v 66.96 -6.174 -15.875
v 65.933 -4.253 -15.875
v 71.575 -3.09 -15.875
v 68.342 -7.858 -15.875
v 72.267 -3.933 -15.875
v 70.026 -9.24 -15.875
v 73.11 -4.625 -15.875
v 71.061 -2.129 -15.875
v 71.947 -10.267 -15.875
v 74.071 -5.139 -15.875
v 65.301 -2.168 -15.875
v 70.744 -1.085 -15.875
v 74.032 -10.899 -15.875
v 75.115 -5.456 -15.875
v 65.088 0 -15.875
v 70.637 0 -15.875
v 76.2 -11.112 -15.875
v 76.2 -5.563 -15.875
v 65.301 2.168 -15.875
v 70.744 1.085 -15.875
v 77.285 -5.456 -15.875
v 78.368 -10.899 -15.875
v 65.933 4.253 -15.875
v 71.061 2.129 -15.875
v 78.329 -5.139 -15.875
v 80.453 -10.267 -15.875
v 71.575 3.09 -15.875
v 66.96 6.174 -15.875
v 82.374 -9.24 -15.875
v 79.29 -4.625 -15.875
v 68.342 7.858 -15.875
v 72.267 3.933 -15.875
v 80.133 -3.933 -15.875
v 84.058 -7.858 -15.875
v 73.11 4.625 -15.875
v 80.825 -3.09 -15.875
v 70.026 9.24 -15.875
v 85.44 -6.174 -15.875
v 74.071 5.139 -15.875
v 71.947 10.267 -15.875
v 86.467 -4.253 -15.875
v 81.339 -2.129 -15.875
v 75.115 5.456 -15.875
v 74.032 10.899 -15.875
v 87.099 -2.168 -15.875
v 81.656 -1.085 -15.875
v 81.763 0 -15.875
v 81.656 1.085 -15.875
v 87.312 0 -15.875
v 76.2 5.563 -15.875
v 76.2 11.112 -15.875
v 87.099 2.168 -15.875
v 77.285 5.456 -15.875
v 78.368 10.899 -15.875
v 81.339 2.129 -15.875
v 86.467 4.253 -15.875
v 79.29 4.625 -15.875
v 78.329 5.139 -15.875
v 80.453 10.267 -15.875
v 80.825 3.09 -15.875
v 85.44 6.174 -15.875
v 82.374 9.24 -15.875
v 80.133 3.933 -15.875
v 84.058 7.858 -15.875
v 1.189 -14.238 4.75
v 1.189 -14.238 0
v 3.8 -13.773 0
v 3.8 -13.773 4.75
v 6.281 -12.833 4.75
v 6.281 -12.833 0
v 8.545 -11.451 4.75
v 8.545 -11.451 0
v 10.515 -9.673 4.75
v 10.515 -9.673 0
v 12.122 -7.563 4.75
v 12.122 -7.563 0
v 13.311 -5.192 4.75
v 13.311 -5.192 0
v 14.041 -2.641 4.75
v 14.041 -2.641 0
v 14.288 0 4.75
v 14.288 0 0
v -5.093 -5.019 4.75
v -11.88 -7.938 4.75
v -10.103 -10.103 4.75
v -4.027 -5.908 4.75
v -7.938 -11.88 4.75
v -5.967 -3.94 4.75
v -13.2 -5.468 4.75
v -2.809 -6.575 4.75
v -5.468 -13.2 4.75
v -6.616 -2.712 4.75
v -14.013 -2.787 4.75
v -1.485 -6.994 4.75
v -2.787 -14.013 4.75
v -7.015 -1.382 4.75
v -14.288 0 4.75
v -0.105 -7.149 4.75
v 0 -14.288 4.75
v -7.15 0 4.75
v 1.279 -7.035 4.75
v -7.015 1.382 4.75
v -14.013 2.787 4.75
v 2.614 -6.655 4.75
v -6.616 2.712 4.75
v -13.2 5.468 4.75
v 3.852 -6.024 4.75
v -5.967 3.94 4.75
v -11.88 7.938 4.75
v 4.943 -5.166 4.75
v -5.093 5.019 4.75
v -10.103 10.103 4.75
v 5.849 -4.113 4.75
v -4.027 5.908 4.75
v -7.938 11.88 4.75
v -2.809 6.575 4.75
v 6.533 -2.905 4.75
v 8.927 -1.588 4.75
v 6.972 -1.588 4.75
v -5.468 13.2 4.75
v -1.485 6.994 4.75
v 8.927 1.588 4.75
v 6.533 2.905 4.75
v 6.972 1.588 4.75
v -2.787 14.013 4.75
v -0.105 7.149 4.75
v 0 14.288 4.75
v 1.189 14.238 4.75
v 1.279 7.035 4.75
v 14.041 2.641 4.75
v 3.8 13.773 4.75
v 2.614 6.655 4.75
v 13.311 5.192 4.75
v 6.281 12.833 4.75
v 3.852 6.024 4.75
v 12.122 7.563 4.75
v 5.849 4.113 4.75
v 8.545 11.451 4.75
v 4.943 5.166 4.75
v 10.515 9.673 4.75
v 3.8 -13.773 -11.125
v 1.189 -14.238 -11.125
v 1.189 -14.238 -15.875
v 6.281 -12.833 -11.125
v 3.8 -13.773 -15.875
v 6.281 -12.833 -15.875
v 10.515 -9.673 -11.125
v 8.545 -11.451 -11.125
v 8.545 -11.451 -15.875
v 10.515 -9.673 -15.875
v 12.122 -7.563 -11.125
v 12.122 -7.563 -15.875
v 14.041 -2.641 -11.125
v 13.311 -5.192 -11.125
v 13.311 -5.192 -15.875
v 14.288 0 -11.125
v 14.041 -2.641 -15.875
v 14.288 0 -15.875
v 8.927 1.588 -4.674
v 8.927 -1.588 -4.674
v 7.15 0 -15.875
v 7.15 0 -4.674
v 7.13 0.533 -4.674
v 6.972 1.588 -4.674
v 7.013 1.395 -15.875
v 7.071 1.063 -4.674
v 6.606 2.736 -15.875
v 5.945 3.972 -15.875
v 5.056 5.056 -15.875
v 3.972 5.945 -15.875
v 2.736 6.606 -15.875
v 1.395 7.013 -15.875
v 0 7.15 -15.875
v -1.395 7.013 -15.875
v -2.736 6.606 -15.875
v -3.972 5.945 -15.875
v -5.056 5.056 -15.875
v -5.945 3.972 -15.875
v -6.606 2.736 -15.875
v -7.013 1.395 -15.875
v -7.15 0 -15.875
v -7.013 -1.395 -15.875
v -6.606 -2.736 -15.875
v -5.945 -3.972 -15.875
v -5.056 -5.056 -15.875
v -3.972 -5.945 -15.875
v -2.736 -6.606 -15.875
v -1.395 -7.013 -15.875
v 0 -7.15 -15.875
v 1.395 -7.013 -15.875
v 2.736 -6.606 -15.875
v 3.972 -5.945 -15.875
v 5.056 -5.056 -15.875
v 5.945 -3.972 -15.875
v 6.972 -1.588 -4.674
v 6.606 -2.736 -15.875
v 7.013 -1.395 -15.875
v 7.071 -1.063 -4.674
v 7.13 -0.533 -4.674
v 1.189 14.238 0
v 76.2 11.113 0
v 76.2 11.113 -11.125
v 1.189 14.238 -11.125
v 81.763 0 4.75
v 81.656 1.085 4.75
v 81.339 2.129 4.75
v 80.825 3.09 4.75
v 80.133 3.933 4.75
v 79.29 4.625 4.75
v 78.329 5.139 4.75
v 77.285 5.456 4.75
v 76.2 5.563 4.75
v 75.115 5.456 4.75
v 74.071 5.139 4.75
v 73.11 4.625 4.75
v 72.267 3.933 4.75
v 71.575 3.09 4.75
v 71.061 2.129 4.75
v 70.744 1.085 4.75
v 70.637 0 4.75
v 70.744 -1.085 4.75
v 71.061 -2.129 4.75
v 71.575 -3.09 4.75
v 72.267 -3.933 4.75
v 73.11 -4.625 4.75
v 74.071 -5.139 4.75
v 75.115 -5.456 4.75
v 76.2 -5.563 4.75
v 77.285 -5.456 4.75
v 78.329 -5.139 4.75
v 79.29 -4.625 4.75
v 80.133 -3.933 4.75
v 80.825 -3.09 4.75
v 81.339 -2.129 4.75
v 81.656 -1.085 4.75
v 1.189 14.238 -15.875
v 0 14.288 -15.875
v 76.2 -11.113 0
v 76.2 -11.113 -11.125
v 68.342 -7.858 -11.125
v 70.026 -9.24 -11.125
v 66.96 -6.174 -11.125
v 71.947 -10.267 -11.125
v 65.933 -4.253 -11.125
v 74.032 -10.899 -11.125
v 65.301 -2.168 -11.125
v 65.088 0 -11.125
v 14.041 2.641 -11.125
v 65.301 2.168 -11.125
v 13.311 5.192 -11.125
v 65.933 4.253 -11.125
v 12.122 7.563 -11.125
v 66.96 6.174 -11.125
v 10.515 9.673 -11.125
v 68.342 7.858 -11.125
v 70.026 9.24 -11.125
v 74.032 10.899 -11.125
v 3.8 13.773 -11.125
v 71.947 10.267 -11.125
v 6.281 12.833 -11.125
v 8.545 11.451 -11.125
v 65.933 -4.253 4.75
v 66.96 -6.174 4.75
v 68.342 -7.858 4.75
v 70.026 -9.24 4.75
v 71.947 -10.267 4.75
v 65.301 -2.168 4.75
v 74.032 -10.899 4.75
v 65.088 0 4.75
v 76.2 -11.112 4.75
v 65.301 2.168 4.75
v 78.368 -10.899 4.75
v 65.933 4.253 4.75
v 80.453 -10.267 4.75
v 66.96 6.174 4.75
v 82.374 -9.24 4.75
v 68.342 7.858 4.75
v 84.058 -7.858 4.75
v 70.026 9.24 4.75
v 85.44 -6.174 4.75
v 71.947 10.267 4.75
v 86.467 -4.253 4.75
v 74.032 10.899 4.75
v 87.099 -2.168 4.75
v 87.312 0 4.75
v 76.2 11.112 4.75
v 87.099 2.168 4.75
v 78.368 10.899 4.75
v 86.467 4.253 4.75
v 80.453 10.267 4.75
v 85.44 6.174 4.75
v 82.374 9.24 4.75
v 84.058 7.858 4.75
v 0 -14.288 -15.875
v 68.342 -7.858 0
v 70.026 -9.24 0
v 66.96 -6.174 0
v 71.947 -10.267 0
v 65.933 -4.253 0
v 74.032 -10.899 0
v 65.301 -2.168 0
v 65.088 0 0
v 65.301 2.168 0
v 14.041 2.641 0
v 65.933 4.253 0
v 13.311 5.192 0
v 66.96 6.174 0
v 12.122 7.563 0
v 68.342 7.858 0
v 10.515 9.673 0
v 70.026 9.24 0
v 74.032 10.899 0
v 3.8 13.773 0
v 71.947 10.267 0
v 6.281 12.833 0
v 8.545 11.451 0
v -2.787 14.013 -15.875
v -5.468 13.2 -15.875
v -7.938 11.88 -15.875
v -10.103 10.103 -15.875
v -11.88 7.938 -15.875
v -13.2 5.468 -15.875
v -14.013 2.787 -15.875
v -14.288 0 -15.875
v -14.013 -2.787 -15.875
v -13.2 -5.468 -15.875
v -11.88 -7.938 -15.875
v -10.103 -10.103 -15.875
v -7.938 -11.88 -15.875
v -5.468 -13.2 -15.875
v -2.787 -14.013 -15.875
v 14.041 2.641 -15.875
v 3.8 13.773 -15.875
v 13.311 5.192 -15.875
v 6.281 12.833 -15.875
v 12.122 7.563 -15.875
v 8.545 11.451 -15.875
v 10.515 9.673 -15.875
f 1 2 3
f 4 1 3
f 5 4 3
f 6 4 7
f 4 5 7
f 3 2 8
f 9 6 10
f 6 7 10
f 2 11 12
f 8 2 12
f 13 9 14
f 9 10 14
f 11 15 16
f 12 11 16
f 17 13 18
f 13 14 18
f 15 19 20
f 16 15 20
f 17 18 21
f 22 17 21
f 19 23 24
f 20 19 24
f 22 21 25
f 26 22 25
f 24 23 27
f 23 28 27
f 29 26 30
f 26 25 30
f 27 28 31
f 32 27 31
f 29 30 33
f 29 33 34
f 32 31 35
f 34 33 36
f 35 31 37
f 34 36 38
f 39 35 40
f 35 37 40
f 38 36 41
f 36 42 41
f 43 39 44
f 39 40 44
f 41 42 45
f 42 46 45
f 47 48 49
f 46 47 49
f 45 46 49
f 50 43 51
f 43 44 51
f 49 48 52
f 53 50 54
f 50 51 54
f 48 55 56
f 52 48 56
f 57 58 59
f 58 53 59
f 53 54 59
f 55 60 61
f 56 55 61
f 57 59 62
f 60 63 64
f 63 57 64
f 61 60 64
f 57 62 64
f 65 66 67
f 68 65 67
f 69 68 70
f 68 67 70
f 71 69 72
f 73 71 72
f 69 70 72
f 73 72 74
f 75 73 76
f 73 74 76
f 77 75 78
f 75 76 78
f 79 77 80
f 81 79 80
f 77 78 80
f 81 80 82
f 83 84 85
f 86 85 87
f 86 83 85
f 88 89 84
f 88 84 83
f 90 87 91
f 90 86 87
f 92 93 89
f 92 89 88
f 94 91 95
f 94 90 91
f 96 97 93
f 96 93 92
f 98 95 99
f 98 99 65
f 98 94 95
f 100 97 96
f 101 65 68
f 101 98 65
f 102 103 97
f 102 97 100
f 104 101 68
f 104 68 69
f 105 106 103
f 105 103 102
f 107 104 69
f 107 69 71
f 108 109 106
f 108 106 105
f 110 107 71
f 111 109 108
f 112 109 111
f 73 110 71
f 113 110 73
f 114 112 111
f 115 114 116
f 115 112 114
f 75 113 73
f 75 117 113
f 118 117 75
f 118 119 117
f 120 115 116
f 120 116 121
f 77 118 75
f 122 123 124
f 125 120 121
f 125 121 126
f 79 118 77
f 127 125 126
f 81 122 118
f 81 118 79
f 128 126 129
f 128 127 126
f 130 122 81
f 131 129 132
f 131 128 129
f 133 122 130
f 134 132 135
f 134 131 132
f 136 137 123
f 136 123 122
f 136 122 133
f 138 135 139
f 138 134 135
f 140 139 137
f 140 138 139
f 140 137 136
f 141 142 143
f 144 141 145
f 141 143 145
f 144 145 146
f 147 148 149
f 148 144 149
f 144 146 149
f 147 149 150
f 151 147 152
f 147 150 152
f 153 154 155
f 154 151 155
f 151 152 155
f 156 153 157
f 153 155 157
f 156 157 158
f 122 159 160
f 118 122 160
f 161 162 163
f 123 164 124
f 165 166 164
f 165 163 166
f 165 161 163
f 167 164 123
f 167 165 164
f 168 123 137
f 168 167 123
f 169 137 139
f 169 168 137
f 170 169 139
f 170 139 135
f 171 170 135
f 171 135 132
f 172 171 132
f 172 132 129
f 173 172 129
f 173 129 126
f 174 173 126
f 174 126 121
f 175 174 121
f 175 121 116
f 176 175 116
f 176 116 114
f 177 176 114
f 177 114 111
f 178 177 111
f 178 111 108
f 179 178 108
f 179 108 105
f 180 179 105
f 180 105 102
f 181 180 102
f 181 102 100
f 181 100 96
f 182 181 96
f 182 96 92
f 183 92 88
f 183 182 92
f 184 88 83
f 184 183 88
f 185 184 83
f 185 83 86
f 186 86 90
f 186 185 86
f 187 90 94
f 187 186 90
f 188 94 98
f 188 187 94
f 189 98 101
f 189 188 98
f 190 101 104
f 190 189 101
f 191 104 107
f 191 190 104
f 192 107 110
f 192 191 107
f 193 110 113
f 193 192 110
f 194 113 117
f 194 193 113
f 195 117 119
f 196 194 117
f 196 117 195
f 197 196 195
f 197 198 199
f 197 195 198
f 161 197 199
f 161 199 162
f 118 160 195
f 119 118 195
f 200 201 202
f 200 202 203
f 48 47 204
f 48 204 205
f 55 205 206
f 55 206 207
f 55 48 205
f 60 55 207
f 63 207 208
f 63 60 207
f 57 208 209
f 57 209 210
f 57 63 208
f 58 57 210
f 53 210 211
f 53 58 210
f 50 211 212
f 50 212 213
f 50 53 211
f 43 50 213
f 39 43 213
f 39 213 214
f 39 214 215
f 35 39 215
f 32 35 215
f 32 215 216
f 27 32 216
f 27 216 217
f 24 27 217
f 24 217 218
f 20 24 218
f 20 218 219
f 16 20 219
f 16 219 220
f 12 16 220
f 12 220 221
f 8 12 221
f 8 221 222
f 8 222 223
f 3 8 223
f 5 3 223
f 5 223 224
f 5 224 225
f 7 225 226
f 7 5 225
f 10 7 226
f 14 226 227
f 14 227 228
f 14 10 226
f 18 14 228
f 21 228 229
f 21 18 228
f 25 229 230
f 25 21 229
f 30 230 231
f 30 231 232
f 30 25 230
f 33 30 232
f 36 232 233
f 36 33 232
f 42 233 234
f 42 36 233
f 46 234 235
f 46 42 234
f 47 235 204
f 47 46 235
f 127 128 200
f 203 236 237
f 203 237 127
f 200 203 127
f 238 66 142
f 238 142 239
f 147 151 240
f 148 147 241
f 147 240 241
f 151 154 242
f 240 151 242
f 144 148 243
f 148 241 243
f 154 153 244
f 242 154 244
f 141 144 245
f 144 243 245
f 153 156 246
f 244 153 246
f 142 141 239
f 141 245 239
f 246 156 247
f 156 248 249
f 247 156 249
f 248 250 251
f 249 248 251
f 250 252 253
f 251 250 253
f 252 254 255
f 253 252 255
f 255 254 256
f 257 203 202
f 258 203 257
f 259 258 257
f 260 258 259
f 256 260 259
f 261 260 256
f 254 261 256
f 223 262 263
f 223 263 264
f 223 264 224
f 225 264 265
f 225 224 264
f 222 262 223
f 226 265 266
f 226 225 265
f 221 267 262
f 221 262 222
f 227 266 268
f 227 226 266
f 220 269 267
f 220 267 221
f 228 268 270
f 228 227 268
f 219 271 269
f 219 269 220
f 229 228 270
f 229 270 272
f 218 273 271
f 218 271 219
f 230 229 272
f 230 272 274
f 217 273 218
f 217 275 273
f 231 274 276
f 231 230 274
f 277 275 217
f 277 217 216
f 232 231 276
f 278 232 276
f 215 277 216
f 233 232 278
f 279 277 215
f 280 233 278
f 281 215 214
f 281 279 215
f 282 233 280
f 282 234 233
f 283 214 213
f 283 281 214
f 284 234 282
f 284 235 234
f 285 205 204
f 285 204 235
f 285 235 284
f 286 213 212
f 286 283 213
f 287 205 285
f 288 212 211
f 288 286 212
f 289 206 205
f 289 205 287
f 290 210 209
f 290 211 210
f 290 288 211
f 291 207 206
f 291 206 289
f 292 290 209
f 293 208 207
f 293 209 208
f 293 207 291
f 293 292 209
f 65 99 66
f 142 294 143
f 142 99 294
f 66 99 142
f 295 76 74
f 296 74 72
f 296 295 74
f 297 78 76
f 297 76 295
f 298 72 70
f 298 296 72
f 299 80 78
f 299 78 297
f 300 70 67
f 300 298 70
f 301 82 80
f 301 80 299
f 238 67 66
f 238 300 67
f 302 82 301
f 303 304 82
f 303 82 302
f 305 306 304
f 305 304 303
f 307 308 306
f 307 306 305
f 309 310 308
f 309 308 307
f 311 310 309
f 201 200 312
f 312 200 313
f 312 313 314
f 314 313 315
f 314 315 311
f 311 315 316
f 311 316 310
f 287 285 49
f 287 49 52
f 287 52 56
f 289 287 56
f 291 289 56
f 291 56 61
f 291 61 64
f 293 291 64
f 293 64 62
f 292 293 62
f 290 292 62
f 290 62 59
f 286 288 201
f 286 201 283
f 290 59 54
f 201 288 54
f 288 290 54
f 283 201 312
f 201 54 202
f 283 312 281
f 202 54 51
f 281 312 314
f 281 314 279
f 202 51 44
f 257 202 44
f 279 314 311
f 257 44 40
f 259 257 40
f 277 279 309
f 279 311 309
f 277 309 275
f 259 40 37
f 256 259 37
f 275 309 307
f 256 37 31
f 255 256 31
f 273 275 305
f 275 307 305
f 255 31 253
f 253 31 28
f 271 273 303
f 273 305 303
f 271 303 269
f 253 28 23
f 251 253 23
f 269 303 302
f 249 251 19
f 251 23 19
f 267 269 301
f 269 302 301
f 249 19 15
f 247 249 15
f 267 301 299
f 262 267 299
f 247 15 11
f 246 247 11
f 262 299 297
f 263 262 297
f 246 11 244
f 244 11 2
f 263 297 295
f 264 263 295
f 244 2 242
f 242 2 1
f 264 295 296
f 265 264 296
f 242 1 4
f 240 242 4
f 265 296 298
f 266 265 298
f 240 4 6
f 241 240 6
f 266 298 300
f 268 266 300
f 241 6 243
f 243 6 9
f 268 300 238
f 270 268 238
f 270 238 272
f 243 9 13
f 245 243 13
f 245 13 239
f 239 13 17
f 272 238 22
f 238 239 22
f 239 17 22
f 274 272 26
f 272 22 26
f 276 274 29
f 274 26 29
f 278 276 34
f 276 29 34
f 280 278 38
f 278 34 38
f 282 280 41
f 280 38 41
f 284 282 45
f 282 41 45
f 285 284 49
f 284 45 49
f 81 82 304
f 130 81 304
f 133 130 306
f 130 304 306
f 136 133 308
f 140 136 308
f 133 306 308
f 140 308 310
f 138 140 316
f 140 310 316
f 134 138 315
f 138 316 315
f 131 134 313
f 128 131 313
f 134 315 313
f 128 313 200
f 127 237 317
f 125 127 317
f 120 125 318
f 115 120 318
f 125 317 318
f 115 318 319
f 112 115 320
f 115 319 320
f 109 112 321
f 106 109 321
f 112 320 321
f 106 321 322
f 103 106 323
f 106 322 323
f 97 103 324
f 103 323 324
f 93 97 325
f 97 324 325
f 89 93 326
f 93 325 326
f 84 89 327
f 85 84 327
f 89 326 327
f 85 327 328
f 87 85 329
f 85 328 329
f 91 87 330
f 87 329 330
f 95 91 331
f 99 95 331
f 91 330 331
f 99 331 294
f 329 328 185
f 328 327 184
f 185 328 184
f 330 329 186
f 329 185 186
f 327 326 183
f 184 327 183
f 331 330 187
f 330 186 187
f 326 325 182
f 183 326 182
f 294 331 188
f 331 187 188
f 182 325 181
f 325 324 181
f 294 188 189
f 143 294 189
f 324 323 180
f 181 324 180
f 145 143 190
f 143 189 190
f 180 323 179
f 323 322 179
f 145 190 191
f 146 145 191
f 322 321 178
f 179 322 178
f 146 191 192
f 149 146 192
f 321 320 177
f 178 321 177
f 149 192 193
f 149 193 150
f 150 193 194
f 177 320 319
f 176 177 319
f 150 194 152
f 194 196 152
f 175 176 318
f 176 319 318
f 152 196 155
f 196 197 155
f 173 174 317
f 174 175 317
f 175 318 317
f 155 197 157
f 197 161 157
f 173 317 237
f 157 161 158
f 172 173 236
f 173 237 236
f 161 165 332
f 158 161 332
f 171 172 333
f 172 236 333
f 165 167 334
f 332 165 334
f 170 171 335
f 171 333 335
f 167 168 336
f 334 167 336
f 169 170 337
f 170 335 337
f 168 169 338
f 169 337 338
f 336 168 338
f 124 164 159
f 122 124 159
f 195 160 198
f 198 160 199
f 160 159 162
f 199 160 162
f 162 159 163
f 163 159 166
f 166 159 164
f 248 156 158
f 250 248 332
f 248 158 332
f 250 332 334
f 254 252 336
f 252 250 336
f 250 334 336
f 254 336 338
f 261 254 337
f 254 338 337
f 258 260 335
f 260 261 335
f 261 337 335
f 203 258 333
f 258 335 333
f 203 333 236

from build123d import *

# Parameters (mm, degrees)
SKETCH1_R               = 7.1501
BOSS_EXTRUDE1_DEPTH     = 4.7498
SKETCH1_R_2             = 11.1125
SKETCH1_R_3             = 5.5626
BOSS_EXTRUDE1_2_DEPTH   = 4.7498
BOSS_EXTRUDE2_DEPTH     = 11.1252
BOSS_EXTRUDE3_START     = -15.875
SKETCH1_4_R             = 7.1501
SKETCH1_4_R_2           = 11.1125
SKETCH1_4_R_3           = 5.5626
BOSS_EXTRUDE3_DEPTH     = 15.875
CUT_EXTRUDE2_DEPTH      = 4.826
CUT_EXTRUDE2_DEPTH_BACK = 4.6736


with BuildPart() as part:
    # Sketch1 → Boss-Extrude1 (new body)
    with BuildSketch(Plane.XY):
        with BuildLine():
            Line((1.188561525, 14.237976603), (0, 14.2875))
            ThreePointArc((0, 14.2875), (-14.2875, 0), (0, -14.2875))
            Line((0, -14.2875), (1.188561525, -14.237976603))
            ThreePointArc((1.188561525, -14.237976603), (14.2875, 0), (1.188561525, 14.237976603))
        make_face()
        Circle(SKETCH1_R, mode=Mode.SUBTRACT)
    extrude(amount=BOSS_EXTRUDE1_DEPTH)



with BuildPart() as body_2:
    # Sketch1 → Boss-Extrude1 2 (new body)
    with BuildSketch(Plane.XY):
        with Locations((76.2, 0)):
            Circle(SKETCH1_R_2)
        with Locations((76.2, 0)):
            Circle(SKETCH1_R_3, mode=Mode.SUBTRACT)
    extrude(amount=BOSS_EXTRUDE1_2_DEPTH)


with BuildPart() as body_3:
    # Sketch1<3> → Boss-Extrude2 (new body)
    with BuildSketch(Plane.XY):
        with BuildLine():
            Line((76.2, 11.1125), (1.188561525, 14.237976603))
            ThreePointArc((1.188561525, 14.237976603), (10.514614331, 9.673445184), (14.2875, 0))
            ThreePointArc((14.2875, 0), (10.514614331, -9.673445184), (1.188561525, -14.237976603))
            Line((1.188561525, -14.237976603), (76.2, -11.1125))
            ThreePointArc((76.2, -11.1125), (65.0875, 0), (76.2, 11.1125))
        make_face()
    extrude(amount=-BOSS_EXTRUDE2_DEPTH)


with BuildPart() as part_1:
    add(part.part)

    add(body_2.part)  # Boss-Extrude3 merges body 2

    add(body_3.part)  # Boss-Extrude3 merges body 3
    # Sketch1<4> → Boss-Extrude3 (add)
    # profile 1 of 2: a face of its own
    with BuildSketch(Plane.XY.offset(BOSS_EXTRUDE3_START)):
        with BuildLine():
            Line((1.188561525, 14.237976603), (0, 14.2875))
            ThreePointArc((0, 14.2875), (-14.2875, 0), (0, -14.2875))
            Line((0, -14.2875), (1.188561525, -14.237976603))
            ThreePointArc((1.188561525, -14.237976603), (14.2875, 0), (1.188561525, 14.237976603))
        make_face()
        Circle(SKETCH1_4_R, mode=Mode.SUBTRACT)
    # profile 2 of 2: a face of its own
    with BuildSketch(Plane.XY.offset(BOSS_EXTRUDE3_START)):
        with Locations((76.2, 0)):
            Circle(SKETCH1_4_R_2)
        with Locations((76.2, 0)):
            Circle(SKETCH1_4_R_3, mode=Mode.SUBTRACT)
    extrude(amount=BOSS_EXTRUDE3_DEPTH)

    # Sketch2 → Cut-Extrude2 (cut, two sides: drawn at the far end of the back side and taken through both)
    with BuildSketch(Plane.XY.offset(-CUT_EXTRUDE2_DEPTH_BACK)):
        Polygon((6.971640679, 0), (6.971640679, 1.5875), (8.927440679, 1.5875), (8.927440679, -1.5875), (6.971640679, -1.5875), align=None)
    extrude(amount=CUT_EXTRUDE2_DEPTH + CUT_EXTRUDE2_DEPTH_BACK, mode=Mode.SUBTRACT)


solid = part_1.part
